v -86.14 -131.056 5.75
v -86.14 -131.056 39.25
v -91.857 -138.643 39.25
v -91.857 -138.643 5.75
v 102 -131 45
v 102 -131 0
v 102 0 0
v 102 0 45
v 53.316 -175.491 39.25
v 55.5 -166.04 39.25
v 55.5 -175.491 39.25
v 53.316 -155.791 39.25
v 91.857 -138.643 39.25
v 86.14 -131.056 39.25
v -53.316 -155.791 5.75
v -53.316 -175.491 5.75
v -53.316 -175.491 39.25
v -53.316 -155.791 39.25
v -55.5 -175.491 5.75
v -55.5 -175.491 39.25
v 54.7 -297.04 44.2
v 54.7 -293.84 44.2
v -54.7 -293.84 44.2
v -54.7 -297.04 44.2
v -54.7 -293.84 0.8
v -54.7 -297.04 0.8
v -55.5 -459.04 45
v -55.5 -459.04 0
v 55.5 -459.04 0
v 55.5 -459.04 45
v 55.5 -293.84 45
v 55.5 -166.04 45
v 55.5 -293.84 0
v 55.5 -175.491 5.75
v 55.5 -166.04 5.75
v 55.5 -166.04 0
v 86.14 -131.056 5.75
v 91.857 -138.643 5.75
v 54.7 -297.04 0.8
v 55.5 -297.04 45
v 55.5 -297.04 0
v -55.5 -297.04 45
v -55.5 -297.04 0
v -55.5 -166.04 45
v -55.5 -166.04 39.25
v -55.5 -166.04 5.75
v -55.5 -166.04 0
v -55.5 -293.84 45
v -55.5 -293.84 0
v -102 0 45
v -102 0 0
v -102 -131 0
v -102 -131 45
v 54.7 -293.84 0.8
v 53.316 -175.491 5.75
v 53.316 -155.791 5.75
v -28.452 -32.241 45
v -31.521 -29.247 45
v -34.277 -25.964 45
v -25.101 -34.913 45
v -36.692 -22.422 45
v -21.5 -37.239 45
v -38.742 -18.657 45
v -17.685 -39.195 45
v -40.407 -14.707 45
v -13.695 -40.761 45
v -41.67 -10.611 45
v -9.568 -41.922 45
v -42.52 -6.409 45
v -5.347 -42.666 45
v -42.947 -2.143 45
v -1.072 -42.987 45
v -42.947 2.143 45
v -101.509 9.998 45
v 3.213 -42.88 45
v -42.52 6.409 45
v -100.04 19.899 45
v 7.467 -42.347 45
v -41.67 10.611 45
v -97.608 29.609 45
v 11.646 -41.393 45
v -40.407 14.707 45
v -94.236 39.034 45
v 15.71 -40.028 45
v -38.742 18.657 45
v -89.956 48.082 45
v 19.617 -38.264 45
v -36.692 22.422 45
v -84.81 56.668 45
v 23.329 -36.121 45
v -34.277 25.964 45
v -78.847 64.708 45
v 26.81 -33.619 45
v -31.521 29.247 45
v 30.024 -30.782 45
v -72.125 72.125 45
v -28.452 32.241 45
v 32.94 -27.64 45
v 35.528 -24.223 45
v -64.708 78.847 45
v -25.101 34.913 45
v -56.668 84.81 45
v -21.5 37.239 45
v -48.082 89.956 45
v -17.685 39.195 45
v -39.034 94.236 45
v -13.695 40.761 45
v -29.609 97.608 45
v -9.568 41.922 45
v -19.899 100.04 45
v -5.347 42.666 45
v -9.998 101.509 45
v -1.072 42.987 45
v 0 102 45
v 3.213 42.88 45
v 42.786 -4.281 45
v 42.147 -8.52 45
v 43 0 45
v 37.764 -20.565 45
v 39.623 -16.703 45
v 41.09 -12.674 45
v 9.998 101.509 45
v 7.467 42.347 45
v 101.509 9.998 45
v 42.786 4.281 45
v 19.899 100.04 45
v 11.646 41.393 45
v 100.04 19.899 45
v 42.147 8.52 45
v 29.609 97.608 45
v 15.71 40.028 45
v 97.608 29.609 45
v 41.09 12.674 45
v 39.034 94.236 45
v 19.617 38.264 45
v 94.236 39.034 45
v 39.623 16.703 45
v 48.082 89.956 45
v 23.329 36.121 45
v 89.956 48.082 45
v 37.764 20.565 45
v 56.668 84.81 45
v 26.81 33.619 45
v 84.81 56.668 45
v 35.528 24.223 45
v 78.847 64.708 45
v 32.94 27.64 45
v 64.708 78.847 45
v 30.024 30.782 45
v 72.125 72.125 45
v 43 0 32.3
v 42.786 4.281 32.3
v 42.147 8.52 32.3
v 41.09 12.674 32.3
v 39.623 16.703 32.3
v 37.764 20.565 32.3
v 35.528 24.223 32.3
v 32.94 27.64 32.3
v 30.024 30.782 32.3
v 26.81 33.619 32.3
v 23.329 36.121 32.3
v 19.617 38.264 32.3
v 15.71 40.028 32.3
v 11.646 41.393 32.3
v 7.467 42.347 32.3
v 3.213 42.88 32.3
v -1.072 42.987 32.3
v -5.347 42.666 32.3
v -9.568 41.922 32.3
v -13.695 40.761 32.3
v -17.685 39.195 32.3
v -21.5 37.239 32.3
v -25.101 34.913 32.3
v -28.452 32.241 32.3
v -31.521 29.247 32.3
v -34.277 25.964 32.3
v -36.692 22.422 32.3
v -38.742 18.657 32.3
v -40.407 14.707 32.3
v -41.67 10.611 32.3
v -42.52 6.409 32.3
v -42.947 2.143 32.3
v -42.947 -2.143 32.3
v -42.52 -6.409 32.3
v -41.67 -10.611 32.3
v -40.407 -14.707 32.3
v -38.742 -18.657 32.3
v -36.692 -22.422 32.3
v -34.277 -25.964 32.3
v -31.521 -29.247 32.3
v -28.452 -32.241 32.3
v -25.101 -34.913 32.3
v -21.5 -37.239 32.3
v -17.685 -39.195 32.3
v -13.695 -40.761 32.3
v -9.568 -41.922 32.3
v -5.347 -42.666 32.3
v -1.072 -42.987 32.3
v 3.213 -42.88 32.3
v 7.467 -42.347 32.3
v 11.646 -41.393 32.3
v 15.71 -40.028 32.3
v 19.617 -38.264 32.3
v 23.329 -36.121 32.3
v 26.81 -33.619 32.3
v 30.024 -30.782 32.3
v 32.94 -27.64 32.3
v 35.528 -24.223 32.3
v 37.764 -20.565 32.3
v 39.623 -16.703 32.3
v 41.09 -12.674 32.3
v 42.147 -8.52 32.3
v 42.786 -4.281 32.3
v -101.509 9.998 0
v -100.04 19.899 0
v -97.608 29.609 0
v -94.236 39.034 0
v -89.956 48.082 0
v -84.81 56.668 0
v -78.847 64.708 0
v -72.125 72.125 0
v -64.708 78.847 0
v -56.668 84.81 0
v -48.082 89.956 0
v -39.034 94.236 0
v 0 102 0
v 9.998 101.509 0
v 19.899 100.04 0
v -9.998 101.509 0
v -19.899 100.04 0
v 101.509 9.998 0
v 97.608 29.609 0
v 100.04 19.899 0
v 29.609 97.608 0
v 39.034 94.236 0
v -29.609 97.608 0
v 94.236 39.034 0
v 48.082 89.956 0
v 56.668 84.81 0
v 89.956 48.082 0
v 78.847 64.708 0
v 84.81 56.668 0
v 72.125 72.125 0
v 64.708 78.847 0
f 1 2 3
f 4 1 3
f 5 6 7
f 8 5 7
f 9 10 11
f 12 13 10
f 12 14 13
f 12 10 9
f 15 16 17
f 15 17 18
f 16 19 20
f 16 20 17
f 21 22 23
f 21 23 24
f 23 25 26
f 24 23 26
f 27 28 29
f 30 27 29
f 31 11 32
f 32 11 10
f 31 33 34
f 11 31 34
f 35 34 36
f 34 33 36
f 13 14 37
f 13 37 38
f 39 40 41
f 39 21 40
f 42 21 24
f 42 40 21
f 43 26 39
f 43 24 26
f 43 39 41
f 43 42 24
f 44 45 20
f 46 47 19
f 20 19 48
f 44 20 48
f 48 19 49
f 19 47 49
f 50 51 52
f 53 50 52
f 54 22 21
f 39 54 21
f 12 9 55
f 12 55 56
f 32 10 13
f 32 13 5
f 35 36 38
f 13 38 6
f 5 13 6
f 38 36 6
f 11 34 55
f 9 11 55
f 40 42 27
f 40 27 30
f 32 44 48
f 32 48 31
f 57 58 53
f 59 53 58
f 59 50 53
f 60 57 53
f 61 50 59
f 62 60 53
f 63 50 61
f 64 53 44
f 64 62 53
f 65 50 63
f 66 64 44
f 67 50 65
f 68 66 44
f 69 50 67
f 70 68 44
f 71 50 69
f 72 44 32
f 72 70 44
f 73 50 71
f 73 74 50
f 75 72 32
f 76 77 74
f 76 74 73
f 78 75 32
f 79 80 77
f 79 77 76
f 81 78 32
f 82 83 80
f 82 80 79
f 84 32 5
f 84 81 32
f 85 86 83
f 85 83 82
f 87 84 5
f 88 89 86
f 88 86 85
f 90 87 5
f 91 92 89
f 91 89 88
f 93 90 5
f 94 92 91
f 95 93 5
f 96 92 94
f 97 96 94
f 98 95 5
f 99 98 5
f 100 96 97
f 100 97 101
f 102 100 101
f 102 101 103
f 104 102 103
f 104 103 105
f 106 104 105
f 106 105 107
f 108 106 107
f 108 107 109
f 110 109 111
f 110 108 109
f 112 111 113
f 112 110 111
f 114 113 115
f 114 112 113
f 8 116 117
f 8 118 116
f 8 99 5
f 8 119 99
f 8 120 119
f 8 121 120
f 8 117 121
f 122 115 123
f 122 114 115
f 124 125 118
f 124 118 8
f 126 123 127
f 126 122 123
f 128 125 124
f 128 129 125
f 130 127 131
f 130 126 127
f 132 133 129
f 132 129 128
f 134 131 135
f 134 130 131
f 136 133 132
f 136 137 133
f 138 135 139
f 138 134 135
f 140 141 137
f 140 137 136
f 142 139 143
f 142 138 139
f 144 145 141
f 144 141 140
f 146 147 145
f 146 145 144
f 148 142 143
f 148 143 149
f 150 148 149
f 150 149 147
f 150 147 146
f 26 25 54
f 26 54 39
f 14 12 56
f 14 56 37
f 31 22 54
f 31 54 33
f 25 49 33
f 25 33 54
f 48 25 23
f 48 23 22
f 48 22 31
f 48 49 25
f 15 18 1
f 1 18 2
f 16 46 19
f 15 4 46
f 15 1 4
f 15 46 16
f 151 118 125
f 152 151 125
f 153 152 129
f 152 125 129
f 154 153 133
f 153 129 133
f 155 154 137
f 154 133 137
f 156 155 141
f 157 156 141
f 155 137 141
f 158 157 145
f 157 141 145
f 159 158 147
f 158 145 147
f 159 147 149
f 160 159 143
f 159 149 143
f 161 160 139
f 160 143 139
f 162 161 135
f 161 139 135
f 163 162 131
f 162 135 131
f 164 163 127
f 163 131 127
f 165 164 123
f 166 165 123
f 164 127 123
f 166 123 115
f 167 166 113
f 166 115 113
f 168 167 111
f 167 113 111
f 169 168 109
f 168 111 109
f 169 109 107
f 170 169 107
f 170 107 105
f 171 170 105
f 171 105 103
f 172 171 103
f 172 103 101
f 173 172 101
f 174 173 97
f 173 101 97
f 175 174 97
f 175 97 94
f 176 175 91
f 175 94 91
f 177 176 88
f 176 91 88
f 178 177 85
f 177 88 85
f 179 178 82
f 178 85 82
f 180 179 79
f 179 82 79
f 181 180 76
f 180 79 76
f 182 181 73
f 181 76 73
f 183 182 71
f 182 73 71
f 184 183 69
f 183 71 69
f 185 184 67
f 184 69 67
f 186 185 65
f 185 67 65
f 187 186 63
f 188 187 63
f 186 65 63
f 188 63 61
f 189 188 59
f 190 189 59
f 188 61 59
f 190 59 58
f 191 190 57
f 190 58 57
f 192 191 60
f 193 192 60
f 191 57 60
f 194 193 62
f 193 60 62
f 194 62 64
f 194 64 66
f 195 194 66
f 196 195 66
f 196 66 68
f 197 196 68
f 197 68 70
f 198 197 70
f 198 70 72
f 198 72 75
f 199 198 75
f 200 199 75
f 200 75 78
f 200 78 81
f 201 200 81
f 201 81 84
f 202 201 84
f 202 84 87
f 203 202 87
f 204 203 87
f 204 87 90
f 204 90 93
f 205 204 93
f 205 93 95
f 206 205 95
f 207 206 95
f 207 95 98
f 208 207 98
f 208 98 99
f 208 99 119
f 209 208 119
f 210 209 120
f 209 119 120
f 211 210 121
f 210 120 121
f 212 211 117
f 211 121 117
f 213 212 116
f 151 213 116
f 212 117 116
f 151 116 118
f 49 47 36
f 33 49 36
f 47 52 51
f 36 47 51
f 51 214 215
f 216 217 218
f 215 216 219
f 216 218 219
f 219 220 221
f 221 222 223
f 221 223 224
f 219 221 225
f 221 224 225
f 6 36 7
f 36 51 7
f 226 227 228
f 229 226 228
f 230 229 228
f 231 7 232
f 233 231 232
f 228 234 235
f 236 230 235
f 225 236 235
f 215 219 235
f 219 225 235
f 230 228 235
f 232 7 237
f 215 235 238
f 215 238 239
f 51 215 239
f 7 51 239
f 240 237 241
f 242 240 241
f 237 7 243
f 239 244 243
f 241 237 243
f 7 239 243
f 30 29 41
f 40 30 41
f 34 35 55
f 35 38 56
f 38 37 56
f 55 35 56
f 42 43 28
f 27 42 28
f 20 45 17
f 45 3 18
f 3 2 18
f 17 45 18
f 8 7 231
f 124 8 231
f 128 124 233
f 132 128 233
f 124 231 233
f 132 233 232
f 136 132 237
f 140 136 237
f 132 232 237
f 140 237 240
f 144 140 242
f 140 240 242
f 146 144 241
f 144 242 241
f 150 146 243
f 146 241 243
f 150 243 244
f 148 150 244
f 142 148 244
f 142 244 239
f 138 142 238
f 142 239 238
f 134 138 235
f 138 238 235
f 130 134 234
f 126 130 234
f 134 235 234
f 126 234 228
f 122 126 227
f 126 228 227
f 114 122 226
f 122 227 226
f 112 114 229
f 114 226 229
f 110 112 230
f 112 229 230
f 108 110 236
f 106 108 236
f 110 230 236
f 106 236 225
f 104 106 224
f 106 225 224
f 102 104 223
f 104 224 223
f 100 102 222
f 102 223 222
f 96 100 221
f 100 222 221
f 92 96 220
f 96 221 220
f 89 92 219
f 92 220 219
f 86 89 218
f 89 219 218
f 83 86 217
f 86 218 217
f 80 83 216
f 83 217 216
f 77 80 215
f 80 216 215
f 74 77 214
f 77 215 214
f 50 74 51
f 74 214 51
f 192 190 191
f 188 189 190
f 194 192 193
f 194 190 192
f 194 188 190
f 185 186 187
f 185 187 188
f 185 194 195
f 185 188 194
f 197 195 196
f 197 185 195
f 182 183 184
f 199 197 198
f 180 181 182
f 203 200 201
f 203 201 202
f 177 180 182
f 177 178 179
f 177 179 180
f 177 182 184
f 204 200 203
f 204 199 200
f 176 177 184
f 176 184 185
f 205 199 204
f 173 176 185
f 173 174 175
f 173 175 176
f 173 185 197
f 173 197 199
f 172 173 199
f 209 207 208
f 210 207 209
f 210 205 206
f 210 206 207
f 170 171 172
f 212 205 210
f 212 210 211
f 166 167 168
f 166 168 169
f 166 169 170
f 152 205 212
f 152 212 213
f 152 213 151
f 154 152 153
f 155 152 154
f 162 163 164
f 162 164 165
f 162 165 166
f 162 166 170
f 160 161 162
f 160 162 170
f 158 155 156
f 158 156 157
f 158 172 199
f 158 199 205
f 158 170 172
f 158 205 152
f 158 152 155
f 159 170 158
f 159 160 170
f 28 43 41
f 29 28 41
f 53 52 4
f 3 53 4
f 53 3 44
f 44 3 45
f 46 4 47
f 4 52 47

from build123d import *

# Parameters (mm, degrees)
EXTRUDE_1_DEPTH     = 45
SKETCH_2_R          = 43
CUT_EXTRUDE_1_DEPTH = 12.7
CUT_EXTRUDE_6_DEPTH = 33.5
SKETCH_6_W          = 0.8
SKETCH_6_H          = 3.2


with BuildPart() as part:
    # Эскиз1 → Бобышка-Вытянуть1 (new body)
    with BuildSketch(Plane.XY):
        with BuildLine():
            Line((-102, 0), (-102, -131))
            Line((-102, -131), (-55.5, -166.04026333))
            Line((-55.5, -166.04026333), (-55.5, -459.04026333))
            Line((-55.5, -459.04026333), (55.5, -459.04026333))
            Line((55.5, -459.04026333), (55.5, -166.04026333))
            Line((55.5, -166.04026333), (102, -131))
            Line((102, -131), (102, 0))
            ThreePointArc((102, 0), (0, 102), (-102, 0))
        make_face()
    extrude(amount=EXTRUDE_1_DEPTH)

    # Эскиз2 → Вырез-Вытянуть1 (cut)
    with BuildSketch(Plane.XY.offset(45)):
        Circle(SKETCH_2_R)
    extrude(amount=-CUT_EXTRUDE_1_DEPTH, mode=Mode.SUBTRACT)

    # Sketch 1 2 → Вырез-Вытянуть6 (cut)
    with BuildSketch(Plane(origin=(91.857329022, -138.643050794, 39.25), x_dir=(-0.7228095146046781, -0.6910473251499855, 0), z_dir=(0, 0, -1))):
        Polygon((0, 0), (45.212193782, 5.321669076), (51.742831193, -1.509132064), (53.321326579, 0), (39.707694274, 14.239347438), (-1.110524428, 9.43486807), align=None)
    cut_extrude_6 = extrude(amount=CUT_EXTRUDE_6_DEPTH, mode=Mode.SUBTRACT)

    # Зеркальное отражение1: Вырез-Вытянуть6 across plane
    add(cut_extrude_6.mirror(Plane(origin=(0, 0, 0), x_dir=(0, 0, 1), z_dir=(1, 0, 0))), mode=Mode.SUBTRACT)

    # Вырез-По траектории1: sweep along a curve in space
    with BuildLine() as sweep_1_path:
        Line((55.5, -295.44026333, 45), (55.5, -295.44026333, 0))
        Line((55.5, -295.44026333, 0), (-55.5, -295.44026333, 0))
        Line((-55.5, -295.44026333, 0), (-55.5, -295.44026333, 45))
        Line((-55.5, -295.44026333, 45), (55.5, -295.44026333, 45))
    # Эскиз6 → Вырез-По траектории1 (sweep, cut)
    with BuildSketch(Plane.XY.offset(45)):
        with Locations((55.1, -295.44026333)):
            Rectangle(SKETCH_6_W, SKETCH_6_H)
    sweep(path=sweep_1_path.line, transition=Transition.RIGHT, mode=Mode.SUBTRACT)


solid = part.part
